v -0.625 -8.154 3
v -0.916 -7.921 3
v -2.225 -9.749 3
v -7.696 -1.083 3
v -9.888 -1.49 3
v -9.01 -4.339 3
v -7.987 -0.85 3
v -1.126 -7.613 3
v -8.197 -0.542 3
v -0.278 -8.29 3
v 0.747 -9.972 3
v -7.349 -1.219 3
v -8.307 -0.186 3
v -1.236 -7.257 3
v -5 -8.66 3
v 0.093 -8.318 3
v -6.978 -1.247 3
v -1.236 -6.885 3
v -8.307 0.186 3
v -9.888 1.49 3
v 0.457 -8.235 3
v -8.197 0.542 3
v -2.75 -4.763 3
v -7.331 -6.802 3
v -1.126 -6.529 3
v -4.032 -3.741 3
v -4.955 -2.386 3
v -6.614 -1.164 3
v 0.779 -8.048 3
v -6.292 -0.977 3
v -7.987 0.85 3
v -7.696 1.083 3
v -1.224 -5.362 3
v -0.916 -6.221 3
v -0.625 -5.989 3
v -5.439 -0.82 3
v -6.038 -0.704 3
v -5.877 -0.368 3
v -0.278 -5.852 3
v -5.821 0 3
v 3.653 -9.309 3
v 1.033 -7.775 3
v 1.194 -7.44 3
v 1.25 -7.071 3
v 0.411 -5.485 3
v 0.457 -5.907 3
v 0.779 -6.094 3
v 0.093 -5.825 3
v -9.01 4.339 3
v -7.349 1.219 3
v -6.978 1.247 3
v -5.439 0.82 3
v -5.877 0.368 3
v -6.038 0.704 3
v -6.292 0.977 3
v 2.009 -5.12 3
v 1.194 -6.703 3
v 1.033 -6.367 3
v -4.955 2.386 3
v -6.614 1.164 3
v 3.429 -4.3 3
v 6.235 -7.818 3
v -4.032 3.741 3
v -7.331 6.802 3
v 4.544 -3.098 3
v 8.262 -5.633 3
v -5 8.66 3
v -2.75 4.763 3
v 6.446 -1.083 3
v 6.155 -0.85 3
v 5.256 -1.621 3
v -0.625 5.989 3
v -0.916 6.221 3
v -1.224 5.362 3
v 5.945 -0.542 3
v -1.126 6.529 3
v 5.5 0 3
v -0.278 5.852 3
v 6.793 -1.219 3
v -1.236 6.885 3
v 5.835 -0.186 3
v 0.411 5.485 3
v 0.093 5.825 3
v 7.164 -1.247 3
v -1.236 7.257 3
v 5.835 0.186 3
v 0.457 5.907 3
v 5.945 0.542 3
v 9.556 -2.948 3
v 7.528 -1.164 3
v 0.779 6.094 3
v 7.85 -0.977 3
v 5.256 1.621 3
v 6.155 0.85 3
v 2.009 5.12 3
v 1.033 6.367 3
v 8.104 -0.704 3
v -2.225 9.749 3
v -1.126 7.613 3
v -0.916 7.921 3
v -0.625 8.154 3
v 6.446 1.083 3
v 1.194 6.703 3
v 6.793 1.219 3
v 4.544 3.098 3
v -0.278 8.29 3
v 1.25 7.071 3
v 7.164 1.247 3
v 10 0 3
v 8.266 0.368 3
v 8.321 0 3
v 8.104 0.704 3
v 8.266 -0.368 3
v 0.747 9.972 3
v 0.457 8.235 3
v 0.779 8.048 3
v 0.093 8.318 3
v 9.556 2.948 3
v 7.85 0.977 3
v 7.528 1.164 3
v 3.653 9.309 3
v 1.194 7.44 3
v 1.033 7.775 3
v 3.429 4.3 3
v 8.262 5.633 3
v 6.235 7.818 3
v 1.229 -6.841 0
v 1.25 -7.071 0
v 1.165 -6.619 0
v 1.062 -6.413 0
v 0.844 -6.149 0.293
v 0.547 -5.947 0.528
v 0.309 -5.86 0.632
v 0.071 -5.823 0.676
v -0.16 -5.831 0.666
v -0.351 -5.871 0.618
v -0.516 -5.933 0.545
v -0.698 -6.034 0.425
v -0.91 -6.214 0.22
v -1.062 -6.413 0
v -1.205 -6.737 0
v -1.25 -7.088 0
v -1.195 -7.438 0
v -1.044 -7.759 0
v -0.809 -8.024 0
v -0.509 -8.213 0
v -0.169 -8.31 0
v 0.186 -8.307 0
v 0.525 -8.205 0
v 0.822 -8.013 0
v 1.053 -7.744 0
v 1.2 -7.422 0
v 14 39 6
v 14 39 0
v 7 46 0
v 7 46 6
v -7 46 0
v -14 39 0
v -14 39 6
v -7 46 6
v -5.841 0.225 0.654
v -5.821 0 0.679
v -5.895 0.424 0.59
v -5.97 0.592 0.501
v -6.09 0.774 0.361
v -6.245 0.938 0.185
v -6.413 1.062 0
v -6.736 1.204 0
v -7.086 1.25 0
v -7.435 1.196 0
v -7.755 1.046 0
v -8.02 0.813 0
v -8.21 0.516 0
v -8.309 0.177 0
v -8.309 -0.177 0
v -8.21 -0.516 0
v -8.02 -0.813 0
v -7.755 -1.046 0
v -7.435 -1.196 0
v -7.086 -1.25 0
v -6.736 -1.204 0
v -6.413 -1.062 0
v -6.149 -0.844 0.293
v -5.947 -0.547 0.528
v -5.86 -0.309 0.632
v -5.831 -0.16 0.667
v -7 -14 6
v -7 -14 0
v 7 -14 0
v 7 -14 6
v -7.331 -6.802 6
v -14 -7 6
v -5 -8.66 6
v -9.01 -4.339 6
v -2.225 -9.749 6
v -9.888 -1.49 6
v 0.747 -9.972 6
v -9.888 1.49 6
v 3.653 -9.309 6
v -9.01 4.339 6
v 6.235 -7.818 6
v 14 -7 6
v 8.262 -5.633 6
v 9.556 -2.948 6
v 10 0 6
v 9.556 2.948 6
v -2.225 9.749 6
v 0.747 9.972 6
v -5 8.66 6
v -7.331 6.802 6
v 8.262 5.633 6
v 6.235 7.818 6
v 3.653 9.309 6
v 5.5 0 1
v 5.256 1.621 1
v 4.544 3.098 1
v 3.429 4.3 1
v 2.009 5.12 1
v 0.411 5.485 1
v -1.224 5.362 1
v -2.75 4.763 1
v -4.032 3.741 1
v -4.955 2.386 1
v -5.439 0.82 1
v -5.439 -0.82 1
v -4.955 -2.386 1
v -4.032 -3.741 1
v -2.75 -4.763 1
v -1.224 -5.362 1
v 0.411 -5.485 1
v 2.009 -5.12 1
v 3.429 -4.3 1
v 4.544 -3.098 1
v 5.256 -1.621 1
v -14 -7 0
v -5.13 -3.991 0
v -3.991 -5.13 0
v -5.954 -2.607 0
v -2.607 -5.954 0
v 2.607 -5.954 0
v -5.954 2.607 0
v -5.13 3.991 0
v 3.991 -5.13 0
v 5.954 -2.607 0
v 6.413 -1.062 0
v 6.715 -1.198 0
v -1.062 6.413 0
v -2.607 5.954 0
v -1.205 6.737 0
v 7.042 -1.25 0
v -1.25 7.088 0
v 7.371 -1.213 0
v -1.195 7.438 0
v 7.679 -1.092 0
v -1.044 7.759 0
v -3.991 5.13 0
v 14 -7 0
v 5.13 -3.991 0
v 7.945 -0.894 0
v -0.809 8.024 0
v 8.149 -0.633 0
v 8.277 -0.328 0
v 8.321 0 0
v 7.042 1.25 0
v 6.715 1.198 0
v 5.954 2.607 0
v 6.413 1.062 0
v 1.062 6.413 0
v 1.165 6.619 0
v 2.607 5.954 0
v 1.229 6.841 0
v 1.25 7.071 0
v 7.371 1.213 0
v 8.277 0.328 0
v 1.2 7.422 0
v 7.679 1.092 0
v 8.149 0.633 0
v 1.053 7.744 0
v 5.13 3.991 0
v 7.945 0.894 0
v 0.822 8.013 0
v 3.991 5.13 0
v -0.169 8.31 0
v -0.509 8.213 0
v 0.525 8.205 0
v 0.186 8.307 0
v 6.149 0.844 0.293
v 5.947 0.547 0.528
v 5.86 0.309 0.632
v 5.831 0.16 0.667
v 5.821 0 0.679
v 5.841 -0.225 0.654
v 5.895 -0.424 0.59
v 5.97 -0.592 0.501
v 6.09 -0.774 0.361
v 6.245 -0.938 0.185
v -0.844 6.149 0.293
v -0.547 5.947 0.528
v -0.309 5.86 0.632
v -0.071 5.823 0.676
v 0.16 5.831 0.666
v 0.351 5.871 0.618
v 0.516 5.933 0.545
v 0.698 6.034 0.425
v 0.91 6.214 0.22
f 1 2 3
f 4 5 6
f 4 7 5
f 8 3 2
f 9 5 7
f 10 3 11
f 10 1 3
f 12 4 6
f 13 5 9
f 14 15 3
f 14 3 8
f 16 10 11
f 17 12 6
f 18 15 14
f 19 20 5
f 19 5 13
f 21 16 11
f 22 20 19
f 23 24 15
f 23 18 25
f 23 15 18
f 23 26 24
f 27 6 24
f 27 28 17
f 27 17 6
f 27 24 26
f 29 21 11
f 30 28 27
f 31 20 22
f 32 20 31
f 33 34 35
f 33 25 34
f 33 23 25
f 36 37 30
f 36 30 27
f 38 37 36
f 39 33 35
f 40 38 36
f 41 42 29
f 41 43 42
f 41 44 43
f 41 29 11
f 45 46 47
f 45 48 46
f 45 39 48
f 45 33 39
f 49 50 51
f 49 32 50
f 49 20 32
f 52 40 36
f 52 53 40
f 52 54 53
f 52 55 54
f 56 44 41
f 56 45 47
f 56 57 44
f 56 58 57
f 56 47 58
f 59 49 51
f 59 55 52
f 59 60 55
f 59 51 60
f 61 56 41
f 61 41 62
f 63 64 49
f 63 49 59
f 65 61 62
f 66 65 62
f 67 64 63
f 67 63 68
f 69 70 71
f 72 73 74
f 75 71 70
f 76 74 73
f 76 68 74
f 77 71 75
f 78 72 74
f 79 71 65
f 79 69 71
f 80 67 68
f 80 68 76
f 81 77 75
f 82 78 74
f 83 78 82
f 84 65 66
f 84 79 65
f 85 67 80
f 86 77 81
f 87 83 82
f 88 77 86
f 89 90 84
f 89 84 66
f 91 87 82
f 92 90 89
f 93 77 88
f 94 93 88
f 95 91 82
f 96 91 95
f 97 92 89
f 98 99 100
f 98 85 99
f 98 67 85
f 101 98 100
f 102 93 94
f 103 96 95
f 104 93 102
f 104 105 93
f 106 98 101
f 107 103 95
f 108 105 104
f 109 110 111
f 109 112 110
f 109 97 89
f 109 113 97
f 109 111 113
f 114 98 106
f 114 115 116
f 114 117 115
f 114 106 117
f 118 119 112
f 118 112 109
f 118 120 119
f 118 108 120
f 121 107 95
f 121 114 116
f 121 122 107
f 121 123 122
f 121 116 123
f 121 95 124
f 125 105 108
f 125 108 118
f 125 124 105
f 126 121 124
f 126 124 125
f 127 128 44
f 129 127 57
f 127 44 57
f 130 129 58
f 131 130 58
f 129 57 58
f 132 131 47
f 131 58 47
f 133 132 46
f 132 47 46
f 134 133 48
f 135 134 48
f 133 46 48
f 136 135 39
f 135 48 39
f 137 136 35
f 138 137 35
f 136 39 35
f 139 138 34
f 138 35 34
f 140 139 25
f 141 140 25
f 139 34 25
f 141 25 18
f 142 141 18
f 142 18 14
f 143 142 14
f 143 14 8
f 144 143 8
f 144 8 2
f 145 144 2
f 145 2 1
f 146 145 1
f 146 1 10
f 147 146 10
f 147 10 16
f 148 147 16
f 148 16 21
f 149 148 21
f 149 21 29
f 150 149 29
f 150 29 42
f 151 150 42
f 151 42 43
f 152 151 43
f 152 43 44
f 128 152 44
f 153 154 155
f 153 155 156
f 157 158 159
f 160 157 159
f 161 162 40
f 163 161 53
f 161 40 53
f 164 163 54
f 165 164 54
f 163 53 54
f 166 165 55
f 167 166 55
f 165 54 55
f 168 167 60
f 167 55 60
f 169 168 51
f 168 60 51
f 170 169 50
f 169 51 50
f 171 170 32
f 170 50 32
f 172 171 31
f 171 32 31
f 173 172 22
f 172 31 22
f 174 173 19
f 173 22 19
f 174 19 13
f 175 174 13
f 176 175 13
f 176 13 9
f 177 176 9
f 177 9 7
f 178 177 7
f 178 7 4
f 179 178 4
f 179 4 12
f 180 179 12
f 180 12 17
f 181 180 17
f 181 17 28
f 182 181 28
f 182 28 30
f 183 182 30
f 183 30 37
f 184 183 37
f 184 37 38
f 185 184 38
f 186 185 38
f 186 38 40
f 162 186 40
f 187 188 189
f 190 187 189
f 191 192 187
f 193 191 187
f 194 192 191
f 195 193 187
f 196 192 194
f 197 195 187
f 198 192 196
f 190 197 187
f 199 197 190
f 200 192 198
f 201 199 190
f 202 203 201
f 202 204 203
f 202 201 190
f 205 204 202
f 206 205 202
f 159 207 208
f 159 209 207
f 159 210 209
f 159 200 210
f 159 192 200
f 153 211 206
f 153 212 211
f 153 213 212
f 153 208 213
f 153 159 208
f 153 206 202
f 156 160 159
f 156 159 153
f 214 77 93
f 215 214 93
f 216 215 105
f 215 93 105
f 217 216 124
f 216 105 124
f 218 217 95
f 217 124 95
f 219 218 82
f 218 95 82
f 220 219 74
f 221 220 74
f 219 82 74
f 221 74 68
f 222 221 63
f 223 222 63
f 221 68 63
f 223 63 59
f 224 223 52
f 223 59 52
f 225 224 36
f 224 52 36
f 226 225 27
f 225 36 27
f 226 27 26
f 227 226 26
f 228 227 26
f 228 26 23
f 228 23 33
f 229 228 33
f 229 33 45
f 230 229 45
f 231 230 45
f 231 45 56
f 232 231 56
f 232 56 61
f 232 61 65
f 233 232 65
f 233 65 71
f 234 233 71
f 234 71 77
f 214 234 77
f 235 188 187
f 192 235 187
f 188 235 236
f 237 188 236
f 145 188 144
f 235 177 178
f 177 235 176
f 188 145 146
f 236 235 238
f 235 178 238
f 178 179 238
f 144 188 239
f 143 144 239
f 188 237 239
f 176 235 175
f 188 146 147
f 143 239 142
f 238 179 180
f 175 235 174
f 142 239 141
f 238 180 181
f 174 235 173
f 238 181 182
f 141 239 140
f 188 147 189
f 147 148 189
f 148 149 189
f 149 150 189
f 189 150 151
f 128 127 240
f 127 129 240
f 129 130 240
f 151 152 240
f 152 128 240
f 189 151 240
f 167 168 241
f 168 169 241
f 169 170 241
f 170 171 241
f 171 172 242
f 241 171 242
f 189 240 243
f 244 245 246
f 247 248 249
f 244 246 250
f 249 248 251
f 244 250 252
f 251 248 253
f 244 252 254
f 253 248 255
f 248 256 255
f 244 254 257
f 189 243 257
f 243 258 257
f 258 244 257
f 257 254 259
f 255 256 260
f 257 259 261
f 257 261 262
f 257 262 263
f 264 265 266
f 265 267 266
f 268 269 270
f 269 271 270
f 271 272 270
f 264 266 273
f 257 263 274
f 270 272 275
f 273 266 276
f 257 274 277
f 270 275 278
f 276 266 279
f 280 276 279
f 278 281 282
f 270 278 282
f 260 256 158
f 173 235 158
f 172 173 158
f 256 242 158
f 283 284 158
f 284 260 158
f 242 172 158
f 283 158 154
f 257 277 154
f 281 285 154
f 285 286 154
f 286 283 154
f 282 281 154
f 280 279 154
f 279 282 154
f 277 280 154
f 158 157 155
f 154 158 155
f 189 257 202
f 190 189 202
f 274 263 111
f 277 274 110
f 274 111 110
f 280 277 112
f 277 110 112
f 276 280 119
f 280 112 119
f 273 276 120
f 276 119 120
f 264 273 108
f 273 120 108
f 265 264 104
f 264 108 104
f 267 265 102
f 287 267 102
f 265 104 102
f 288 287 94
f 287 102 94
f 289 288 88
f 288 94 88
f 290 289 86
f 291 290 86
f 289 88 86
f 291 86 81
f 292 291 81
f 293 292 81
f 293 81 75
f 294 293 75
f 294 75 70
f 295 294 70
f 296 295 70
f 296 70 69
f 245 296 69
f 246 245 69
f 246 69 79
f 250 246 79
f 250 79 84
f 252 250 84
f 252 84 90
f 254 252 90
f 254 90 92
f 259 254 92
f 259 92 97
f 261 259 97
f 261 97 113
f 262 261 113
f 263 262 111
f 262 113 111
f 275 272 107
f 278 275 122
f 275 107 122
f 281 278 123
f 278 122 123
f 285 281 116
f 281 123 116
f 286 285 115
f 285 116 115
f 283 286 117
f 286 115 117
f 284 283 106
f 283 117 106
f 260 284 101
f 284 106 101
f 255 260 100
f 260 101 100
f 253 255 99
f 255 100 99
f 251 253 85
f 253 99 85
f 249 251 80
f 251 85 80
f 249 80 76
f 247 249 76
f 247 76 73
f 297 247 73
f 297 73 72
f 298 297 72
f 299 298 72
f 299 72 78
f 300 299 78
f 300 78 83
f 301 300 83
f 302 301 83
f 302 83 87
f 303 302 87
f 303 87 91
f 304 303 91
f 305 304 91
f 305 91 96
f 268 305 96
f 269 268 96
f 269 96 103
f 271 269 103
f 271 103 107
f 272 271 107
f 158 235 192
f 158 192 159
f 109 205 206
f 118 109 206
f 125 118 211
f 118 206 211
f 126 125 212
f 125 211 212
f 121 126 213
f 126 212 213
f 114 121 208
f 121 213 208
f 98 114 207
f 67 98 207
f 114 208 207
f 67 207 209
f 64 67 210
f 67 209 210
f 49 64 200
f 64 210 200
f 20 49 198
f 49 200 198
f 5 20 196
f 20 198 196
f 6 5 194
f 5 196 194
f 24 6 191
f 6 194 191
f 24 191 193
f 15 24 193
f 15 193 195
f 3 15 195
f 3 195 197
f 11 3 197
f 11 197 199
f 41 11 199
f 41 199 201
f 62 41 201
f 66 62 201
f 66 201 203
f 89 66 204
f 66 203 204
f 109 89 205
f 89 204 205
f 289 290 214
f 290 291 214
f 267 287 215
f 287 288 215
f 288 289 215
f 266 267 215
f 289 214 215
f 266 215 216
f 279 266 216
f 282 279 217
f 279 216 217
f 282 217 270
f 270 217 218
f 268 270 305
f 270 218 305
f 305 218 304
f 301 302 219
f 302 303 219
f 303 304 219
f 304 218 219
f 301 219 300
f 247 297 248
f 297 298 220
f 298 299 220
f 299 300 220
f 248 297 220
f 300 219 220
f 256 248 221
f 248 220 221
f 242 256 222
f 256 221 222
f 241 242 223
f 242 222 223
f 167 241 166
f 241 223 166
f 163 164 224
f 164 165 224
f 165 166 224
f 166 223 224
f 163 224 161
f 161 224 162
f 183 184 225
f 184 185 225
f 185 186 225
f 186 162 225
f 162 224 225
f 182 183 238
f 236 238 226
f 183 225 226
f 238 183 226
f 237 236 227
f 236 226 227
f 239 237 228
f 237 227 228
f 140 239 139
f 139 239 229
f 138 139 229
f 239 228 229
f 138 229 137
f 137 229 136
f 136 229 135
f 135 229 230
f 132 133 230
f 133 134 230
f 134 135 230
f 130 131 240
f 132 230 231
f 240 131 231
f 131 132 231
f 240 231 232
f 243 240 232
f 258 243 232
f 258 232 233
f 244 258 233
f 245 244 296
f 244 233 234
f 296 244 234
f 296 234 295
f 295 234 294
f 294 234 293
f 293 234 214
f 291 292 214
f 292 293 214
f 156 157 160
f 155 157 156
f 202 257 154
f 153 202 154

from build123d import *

# Parameters (mm, degrees)
F0_W     = 28
F0_H     = 60
F1_DEPTH = 6
F2_R     = 10
F3_DEPTH = 3
F4_R     = 5.5
F4_R_2   = 1.25
F5_DEPTH = 3.001
F7_SIZE  = 7


# Not quite as in the source:
# - a fillet or chamfer that OpenCascade refuses, or shapes differently, is made with other operations: its cross-section is extruded or revolved along the edge and cut away or added


with BuildPart() as f1:
    # F0 (on Top) → F1 (new body)
    with BuildSketch(Plane.XY):
        with Locations((0, 16)):
            Rectangle(F0_W, F0_H)
    extrude(amount=F1_DEPTH)

    # F2 (on face) → F3 (cut)
    with BuildSketch(Plane.XY.offset(6)):
        Circle(F2_R)
    extrude(amount=-F3_DEPTH, mode=Mode.SUBTRACT)

    # F4 (on face) → F5 (cut, through all)
    with BuildSketch(Plane.XY.offset(3)):
        Circle(F4_R)
        with Locations((0, 7.0710678119)):
            Circle(F4_R_2)
        with Locations((7.0710678119, 0)):
            Circle(F4_R_2)
        with Locations((0, -7.0710678119)):
            Circle(F4_R_2)
        with Locations((-7.0710678119, 0)):
            Circle(F4_R_2)
    extrude(amount=-F5_DEPTH, mode=Mode.SUBTRACT)

    # F6: chamfer of 1 on 1 edges, made by hand

    # F6_s1 → F6_t2 (revolve, cut)
    with BuildSketch(Plane.XZ):
        Polygon((6.5, 0), (5.5, 1), (5.5, 0), align=None)
    revolve(axis=Axis((0, 0, 0), (0, 0, 1)), mode=Mode.SUBTRACT)

    # F7
    f7_edges = [f1.edges().sort_by_distance(p)[0] for p in [
        (14, -14, 3),
        (-14, -14, 3),
        (14, 46, 3),
        (-14, 46, 3),
    ]]
    chamfer(f7_edges, length=F7_SIZE)


solid = f1.part
